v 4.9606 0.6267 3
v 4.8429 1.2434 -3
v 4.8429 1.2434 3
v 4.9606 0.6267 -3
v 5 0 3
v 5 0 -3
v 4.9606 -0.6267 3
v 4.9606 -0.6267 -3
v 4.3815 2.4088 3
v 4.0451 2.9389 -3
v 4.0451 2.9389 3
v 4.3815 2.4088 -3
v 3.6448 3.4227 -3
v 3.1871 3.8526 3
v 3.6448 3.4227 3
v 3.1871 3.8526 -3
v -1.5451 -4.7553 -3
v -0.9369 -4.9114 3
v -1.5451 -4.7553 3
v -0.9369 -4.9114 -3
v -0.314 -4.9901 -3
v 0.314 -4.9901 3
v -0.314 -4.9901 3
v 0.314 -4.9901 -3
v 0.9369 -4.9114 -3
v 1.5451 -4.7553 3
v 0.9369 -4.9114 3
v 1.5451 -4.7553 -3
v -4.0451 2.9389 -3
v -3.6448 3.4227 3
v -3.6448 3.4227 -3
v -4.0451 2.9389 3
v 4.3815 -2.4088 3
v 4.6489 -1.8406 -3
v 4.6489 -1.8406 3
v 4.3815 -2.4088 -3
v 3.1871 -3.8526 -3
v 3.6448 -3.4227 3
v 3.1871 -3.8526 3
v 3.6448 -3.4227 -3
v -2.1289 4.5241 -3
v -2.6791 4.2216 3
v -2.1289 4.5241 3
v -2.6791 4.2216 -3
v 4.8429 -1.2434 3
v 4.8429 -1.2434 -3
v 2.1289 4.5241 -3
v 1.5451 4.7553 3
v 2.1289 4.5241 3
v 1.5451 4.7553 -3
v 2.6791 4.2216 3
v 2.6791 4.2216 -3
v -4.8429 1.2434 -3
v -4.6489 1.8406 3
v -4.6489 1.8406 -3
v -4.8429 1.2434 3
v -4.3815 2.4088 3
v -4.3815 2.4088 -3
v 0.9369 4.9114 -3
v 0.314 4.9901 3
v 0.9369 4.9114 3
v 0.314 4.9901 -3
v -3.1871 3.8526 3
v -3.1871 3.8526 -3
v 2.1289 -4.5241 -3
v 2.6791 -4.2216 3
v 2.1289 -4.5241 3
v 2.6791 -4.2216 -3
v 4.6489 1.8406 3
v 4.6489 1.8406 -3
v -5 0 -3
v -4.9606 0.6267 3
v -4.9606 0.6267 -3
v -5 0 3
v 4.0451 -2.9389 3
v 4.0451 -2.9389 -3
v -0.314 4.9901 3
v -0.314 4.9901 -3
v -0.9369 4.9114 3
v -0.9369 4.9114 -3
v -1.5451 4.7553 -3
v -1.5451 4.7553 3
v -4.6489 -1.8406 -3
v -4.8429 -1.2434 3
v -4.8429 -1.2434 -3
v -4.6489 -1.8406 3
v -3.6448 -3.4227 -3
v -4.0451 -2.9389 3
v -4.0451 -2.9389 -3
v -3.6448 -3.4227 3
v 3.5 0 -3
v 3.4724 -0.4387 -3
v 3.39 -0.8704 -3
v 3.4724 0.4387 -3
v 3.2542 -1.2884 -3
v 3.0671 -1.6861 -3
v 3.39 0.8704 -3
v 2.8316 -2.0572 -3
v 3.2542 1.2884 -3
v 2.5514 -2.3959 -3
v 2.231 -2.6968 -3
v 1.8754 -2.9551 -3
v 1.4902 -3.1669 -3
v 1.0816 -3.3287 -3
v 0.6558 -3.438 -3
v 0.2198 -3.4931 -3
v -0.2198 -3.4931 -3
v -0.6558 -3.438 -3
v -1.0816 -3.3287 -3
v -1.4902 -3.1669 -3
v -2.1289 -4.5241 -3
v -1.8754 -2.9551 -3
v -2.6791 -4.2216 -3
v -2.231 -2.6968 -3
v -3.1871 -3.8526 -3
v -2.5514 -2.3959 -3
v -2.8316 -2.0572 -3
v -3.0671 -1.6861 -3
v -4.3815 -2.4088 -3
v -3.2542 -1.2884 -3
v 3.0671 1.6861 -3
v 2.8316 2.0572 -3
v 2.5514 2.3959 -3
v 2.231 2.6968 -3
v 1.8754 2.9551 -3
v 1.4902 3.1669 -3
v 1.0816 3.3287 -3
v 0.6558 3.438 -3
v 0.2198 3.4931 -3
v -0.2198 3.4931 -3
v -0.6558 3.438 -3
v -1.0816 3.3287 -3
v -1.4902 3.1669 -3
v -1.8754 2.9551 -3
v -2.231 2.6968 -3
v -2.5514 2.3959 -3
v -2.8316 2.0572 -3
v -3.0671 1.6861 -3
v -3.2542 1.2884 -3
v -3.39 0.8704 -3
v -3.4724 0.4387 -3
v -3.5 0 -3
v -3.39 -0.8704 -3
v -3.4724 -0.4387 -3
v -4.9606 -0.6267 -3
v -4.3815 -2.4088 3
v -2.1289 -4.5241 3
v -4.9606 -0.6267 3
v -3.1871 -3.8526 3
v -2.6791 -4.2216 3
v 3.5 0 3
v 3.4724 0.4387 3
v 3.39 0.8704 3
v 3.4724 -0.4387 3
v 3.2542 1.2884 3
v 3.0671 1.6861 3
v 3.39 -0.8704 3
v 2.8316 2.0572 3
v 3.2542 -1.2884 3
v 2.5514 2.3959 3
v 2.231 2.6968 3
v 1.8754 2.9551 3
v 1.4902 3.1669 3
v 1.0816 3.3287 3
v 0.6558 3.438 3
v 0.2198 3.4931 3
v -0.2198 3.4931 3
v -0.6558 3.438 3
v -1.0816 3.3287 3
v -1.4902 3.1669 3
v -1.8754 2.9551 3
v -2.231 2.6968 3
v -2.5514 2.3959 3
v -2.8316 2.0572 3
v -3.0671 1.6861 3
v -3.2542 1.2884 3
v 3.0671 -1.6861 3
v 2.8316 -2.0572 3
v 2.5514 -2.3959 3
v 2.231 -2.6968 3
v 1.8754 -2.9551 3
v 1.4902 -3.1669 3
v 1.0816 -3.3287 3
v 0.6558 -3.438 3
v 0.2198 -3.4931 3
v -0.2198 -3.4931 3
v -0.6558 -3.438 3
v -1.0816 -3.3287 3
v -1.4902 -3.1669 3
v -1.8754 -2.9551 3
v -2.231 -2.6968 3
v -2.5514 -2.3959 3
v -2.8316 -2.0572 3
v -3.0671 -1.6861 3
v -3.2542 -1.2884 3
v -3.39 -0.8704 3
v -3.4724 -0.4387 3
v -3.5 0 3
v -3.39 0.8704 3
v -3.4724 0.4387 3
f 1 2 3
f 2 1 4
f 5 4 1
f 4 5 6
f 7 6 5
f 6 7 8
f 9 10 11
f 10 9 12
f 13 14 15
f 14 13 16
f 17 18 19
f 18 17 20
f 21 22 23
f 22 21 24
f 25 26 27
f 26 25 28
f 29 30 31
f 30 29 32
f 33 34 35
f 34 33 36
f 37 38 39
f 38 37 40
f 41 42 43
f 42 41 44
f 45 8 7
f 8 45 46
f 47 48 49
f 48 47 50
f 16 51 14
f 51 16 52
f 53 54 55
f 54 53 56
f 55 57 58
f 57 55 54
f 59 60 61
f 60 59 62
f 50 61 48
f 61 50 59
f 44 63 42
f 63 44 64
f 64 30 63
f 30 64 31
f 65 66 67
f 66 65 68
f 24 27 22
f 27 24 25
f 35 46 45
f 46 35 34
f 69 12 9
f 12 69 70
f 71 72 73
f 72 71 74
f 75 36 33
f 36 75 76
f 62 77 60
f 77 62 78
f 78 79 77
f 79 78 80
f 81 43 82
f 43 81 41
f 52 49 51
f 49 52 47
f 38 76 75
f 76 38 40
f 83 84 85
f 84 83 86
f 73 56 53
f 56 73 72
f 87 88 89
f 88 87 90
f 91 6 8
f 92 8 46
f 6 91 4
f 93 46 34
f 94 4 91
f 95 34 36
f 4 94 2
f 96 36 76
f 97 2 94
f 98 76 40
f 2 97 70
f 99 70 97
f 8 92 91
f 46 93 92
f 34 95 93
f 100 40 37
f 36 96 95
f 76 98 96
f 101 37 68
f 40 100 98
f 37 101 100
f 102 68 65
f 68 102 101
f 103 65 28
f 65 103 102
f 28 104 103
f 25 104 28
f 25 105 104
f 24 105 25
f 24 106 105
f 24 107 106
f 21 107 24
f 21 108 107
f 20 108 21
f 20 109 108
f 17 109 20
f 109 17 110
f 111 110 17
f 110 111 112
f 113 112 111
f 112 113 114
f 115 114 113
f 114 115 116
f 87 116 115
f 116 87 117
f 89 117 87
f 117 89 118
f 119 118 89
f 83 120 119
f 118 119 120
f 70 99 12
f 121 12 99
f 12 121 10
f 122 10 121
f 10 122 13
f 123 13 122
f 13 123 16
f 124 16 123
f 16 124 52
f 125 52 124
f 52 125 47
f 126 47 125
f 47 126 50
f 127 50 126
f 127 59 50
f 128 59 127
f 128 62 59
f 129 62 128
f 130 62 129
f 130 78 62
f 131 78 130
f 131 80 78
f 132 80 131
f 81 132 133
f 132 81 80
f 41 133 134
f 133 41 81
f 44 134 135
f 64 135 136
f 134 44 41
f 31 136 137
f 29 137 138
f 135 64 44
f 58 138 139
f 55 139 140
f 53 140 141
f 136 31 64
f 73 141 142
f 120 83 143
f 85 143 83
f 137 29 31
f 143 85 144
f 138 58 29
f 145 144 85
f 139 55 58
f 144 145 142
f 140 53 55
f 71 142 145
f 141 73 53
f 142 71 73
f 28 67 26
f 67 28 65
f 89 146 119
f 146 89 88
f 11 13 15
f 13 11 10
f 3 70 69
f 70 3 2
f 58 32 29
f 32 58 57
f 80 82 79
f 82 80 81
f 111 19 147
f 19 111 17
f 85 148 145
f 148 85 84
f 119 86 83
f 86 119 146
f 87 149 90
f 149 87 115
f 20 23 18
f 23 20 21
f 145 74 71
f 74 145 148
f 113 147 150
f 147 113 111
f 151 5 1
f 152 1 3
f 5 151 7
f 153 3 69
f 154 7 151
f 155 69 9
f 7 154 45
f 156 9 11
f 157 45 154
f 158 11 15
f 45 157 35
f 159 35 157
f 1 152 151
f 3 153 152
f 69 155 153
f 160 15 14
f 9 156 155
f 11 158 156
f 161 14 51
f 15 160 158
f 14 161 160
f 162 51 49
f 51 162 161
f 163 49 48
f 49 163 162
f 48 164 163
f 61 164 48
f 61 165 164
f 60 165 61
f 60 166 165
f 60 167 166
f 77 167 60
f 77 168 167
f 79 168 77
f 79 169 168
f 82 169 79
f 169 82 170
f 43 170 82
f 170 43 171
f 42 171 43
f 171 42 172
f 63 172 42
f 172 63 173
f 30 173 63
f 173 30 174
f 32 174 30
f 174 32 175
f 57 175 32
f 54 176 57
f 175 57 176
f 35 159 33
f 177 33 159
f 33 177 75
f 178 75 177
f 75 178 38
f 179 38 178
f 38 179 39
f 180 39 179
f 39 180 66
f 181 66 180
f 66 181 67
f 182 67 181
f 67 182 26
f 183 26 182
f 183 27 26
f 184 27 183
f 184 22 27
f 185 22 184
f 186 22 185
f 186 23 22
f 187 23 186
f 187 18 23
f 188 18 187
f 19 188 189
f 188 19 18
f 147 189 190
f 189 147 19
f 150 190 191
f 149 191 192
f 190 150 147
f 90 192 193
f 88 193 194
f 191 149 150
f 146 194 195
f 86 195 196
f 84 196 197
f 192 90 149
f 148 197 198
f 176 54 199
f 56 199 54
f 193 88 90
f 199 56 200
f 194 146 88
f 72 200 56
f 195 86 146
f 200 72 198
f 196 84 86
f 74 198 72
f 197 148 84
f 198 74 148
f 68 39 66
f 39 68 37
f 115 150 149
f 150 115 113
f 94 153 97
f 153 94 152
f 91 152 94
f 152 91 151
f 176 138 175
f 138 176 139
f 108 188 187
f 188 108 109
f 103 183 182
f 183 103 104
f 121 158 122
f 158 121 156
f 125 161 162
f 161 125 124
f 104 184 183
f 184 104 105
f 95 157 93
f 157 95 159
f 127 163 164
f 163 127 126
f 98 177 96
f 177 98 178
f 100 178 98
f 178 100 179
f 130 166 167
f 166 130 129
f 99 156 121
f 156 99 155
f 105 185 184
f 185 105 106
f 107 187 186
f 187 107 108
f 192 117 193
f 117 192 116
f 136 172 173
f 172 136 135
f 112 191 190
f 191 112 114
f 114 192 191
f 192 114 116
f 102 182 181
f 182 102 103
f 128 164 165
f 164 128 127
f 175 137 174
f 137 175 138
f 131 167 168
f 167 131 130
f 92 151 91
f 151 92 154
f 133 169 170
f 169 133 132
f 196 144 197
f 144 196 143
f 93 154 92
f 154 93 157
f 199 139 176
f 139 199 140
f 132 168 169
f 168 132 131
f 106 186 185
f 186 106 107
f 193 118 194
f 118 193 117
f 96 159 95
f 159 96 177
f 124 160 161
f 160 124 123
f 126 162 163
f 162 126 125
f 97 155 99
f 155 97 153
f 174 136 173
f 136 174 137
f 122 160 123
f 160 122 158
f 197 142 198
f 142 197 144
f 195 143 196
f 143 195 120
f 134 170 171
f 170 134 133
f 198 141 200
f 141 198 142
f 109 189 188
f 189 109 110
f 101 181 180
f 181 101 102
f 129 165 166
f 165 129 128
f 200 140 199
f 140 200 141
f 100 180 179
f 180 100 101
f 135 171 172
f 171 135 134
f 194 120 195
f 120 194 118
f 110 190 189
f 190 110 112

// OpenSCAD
$fn = 50;


difference() {
	union() {
		translate(v = [0, 0, -3.0000000000]) {
			cylinder(h = 6, r = 5.0000000000);
		}
	}
	union() {
		translate(v = [0, 0, -100.0000000000]) {
			cylinder(h = 200, r = 3.5000000000);
		}
	}
}
